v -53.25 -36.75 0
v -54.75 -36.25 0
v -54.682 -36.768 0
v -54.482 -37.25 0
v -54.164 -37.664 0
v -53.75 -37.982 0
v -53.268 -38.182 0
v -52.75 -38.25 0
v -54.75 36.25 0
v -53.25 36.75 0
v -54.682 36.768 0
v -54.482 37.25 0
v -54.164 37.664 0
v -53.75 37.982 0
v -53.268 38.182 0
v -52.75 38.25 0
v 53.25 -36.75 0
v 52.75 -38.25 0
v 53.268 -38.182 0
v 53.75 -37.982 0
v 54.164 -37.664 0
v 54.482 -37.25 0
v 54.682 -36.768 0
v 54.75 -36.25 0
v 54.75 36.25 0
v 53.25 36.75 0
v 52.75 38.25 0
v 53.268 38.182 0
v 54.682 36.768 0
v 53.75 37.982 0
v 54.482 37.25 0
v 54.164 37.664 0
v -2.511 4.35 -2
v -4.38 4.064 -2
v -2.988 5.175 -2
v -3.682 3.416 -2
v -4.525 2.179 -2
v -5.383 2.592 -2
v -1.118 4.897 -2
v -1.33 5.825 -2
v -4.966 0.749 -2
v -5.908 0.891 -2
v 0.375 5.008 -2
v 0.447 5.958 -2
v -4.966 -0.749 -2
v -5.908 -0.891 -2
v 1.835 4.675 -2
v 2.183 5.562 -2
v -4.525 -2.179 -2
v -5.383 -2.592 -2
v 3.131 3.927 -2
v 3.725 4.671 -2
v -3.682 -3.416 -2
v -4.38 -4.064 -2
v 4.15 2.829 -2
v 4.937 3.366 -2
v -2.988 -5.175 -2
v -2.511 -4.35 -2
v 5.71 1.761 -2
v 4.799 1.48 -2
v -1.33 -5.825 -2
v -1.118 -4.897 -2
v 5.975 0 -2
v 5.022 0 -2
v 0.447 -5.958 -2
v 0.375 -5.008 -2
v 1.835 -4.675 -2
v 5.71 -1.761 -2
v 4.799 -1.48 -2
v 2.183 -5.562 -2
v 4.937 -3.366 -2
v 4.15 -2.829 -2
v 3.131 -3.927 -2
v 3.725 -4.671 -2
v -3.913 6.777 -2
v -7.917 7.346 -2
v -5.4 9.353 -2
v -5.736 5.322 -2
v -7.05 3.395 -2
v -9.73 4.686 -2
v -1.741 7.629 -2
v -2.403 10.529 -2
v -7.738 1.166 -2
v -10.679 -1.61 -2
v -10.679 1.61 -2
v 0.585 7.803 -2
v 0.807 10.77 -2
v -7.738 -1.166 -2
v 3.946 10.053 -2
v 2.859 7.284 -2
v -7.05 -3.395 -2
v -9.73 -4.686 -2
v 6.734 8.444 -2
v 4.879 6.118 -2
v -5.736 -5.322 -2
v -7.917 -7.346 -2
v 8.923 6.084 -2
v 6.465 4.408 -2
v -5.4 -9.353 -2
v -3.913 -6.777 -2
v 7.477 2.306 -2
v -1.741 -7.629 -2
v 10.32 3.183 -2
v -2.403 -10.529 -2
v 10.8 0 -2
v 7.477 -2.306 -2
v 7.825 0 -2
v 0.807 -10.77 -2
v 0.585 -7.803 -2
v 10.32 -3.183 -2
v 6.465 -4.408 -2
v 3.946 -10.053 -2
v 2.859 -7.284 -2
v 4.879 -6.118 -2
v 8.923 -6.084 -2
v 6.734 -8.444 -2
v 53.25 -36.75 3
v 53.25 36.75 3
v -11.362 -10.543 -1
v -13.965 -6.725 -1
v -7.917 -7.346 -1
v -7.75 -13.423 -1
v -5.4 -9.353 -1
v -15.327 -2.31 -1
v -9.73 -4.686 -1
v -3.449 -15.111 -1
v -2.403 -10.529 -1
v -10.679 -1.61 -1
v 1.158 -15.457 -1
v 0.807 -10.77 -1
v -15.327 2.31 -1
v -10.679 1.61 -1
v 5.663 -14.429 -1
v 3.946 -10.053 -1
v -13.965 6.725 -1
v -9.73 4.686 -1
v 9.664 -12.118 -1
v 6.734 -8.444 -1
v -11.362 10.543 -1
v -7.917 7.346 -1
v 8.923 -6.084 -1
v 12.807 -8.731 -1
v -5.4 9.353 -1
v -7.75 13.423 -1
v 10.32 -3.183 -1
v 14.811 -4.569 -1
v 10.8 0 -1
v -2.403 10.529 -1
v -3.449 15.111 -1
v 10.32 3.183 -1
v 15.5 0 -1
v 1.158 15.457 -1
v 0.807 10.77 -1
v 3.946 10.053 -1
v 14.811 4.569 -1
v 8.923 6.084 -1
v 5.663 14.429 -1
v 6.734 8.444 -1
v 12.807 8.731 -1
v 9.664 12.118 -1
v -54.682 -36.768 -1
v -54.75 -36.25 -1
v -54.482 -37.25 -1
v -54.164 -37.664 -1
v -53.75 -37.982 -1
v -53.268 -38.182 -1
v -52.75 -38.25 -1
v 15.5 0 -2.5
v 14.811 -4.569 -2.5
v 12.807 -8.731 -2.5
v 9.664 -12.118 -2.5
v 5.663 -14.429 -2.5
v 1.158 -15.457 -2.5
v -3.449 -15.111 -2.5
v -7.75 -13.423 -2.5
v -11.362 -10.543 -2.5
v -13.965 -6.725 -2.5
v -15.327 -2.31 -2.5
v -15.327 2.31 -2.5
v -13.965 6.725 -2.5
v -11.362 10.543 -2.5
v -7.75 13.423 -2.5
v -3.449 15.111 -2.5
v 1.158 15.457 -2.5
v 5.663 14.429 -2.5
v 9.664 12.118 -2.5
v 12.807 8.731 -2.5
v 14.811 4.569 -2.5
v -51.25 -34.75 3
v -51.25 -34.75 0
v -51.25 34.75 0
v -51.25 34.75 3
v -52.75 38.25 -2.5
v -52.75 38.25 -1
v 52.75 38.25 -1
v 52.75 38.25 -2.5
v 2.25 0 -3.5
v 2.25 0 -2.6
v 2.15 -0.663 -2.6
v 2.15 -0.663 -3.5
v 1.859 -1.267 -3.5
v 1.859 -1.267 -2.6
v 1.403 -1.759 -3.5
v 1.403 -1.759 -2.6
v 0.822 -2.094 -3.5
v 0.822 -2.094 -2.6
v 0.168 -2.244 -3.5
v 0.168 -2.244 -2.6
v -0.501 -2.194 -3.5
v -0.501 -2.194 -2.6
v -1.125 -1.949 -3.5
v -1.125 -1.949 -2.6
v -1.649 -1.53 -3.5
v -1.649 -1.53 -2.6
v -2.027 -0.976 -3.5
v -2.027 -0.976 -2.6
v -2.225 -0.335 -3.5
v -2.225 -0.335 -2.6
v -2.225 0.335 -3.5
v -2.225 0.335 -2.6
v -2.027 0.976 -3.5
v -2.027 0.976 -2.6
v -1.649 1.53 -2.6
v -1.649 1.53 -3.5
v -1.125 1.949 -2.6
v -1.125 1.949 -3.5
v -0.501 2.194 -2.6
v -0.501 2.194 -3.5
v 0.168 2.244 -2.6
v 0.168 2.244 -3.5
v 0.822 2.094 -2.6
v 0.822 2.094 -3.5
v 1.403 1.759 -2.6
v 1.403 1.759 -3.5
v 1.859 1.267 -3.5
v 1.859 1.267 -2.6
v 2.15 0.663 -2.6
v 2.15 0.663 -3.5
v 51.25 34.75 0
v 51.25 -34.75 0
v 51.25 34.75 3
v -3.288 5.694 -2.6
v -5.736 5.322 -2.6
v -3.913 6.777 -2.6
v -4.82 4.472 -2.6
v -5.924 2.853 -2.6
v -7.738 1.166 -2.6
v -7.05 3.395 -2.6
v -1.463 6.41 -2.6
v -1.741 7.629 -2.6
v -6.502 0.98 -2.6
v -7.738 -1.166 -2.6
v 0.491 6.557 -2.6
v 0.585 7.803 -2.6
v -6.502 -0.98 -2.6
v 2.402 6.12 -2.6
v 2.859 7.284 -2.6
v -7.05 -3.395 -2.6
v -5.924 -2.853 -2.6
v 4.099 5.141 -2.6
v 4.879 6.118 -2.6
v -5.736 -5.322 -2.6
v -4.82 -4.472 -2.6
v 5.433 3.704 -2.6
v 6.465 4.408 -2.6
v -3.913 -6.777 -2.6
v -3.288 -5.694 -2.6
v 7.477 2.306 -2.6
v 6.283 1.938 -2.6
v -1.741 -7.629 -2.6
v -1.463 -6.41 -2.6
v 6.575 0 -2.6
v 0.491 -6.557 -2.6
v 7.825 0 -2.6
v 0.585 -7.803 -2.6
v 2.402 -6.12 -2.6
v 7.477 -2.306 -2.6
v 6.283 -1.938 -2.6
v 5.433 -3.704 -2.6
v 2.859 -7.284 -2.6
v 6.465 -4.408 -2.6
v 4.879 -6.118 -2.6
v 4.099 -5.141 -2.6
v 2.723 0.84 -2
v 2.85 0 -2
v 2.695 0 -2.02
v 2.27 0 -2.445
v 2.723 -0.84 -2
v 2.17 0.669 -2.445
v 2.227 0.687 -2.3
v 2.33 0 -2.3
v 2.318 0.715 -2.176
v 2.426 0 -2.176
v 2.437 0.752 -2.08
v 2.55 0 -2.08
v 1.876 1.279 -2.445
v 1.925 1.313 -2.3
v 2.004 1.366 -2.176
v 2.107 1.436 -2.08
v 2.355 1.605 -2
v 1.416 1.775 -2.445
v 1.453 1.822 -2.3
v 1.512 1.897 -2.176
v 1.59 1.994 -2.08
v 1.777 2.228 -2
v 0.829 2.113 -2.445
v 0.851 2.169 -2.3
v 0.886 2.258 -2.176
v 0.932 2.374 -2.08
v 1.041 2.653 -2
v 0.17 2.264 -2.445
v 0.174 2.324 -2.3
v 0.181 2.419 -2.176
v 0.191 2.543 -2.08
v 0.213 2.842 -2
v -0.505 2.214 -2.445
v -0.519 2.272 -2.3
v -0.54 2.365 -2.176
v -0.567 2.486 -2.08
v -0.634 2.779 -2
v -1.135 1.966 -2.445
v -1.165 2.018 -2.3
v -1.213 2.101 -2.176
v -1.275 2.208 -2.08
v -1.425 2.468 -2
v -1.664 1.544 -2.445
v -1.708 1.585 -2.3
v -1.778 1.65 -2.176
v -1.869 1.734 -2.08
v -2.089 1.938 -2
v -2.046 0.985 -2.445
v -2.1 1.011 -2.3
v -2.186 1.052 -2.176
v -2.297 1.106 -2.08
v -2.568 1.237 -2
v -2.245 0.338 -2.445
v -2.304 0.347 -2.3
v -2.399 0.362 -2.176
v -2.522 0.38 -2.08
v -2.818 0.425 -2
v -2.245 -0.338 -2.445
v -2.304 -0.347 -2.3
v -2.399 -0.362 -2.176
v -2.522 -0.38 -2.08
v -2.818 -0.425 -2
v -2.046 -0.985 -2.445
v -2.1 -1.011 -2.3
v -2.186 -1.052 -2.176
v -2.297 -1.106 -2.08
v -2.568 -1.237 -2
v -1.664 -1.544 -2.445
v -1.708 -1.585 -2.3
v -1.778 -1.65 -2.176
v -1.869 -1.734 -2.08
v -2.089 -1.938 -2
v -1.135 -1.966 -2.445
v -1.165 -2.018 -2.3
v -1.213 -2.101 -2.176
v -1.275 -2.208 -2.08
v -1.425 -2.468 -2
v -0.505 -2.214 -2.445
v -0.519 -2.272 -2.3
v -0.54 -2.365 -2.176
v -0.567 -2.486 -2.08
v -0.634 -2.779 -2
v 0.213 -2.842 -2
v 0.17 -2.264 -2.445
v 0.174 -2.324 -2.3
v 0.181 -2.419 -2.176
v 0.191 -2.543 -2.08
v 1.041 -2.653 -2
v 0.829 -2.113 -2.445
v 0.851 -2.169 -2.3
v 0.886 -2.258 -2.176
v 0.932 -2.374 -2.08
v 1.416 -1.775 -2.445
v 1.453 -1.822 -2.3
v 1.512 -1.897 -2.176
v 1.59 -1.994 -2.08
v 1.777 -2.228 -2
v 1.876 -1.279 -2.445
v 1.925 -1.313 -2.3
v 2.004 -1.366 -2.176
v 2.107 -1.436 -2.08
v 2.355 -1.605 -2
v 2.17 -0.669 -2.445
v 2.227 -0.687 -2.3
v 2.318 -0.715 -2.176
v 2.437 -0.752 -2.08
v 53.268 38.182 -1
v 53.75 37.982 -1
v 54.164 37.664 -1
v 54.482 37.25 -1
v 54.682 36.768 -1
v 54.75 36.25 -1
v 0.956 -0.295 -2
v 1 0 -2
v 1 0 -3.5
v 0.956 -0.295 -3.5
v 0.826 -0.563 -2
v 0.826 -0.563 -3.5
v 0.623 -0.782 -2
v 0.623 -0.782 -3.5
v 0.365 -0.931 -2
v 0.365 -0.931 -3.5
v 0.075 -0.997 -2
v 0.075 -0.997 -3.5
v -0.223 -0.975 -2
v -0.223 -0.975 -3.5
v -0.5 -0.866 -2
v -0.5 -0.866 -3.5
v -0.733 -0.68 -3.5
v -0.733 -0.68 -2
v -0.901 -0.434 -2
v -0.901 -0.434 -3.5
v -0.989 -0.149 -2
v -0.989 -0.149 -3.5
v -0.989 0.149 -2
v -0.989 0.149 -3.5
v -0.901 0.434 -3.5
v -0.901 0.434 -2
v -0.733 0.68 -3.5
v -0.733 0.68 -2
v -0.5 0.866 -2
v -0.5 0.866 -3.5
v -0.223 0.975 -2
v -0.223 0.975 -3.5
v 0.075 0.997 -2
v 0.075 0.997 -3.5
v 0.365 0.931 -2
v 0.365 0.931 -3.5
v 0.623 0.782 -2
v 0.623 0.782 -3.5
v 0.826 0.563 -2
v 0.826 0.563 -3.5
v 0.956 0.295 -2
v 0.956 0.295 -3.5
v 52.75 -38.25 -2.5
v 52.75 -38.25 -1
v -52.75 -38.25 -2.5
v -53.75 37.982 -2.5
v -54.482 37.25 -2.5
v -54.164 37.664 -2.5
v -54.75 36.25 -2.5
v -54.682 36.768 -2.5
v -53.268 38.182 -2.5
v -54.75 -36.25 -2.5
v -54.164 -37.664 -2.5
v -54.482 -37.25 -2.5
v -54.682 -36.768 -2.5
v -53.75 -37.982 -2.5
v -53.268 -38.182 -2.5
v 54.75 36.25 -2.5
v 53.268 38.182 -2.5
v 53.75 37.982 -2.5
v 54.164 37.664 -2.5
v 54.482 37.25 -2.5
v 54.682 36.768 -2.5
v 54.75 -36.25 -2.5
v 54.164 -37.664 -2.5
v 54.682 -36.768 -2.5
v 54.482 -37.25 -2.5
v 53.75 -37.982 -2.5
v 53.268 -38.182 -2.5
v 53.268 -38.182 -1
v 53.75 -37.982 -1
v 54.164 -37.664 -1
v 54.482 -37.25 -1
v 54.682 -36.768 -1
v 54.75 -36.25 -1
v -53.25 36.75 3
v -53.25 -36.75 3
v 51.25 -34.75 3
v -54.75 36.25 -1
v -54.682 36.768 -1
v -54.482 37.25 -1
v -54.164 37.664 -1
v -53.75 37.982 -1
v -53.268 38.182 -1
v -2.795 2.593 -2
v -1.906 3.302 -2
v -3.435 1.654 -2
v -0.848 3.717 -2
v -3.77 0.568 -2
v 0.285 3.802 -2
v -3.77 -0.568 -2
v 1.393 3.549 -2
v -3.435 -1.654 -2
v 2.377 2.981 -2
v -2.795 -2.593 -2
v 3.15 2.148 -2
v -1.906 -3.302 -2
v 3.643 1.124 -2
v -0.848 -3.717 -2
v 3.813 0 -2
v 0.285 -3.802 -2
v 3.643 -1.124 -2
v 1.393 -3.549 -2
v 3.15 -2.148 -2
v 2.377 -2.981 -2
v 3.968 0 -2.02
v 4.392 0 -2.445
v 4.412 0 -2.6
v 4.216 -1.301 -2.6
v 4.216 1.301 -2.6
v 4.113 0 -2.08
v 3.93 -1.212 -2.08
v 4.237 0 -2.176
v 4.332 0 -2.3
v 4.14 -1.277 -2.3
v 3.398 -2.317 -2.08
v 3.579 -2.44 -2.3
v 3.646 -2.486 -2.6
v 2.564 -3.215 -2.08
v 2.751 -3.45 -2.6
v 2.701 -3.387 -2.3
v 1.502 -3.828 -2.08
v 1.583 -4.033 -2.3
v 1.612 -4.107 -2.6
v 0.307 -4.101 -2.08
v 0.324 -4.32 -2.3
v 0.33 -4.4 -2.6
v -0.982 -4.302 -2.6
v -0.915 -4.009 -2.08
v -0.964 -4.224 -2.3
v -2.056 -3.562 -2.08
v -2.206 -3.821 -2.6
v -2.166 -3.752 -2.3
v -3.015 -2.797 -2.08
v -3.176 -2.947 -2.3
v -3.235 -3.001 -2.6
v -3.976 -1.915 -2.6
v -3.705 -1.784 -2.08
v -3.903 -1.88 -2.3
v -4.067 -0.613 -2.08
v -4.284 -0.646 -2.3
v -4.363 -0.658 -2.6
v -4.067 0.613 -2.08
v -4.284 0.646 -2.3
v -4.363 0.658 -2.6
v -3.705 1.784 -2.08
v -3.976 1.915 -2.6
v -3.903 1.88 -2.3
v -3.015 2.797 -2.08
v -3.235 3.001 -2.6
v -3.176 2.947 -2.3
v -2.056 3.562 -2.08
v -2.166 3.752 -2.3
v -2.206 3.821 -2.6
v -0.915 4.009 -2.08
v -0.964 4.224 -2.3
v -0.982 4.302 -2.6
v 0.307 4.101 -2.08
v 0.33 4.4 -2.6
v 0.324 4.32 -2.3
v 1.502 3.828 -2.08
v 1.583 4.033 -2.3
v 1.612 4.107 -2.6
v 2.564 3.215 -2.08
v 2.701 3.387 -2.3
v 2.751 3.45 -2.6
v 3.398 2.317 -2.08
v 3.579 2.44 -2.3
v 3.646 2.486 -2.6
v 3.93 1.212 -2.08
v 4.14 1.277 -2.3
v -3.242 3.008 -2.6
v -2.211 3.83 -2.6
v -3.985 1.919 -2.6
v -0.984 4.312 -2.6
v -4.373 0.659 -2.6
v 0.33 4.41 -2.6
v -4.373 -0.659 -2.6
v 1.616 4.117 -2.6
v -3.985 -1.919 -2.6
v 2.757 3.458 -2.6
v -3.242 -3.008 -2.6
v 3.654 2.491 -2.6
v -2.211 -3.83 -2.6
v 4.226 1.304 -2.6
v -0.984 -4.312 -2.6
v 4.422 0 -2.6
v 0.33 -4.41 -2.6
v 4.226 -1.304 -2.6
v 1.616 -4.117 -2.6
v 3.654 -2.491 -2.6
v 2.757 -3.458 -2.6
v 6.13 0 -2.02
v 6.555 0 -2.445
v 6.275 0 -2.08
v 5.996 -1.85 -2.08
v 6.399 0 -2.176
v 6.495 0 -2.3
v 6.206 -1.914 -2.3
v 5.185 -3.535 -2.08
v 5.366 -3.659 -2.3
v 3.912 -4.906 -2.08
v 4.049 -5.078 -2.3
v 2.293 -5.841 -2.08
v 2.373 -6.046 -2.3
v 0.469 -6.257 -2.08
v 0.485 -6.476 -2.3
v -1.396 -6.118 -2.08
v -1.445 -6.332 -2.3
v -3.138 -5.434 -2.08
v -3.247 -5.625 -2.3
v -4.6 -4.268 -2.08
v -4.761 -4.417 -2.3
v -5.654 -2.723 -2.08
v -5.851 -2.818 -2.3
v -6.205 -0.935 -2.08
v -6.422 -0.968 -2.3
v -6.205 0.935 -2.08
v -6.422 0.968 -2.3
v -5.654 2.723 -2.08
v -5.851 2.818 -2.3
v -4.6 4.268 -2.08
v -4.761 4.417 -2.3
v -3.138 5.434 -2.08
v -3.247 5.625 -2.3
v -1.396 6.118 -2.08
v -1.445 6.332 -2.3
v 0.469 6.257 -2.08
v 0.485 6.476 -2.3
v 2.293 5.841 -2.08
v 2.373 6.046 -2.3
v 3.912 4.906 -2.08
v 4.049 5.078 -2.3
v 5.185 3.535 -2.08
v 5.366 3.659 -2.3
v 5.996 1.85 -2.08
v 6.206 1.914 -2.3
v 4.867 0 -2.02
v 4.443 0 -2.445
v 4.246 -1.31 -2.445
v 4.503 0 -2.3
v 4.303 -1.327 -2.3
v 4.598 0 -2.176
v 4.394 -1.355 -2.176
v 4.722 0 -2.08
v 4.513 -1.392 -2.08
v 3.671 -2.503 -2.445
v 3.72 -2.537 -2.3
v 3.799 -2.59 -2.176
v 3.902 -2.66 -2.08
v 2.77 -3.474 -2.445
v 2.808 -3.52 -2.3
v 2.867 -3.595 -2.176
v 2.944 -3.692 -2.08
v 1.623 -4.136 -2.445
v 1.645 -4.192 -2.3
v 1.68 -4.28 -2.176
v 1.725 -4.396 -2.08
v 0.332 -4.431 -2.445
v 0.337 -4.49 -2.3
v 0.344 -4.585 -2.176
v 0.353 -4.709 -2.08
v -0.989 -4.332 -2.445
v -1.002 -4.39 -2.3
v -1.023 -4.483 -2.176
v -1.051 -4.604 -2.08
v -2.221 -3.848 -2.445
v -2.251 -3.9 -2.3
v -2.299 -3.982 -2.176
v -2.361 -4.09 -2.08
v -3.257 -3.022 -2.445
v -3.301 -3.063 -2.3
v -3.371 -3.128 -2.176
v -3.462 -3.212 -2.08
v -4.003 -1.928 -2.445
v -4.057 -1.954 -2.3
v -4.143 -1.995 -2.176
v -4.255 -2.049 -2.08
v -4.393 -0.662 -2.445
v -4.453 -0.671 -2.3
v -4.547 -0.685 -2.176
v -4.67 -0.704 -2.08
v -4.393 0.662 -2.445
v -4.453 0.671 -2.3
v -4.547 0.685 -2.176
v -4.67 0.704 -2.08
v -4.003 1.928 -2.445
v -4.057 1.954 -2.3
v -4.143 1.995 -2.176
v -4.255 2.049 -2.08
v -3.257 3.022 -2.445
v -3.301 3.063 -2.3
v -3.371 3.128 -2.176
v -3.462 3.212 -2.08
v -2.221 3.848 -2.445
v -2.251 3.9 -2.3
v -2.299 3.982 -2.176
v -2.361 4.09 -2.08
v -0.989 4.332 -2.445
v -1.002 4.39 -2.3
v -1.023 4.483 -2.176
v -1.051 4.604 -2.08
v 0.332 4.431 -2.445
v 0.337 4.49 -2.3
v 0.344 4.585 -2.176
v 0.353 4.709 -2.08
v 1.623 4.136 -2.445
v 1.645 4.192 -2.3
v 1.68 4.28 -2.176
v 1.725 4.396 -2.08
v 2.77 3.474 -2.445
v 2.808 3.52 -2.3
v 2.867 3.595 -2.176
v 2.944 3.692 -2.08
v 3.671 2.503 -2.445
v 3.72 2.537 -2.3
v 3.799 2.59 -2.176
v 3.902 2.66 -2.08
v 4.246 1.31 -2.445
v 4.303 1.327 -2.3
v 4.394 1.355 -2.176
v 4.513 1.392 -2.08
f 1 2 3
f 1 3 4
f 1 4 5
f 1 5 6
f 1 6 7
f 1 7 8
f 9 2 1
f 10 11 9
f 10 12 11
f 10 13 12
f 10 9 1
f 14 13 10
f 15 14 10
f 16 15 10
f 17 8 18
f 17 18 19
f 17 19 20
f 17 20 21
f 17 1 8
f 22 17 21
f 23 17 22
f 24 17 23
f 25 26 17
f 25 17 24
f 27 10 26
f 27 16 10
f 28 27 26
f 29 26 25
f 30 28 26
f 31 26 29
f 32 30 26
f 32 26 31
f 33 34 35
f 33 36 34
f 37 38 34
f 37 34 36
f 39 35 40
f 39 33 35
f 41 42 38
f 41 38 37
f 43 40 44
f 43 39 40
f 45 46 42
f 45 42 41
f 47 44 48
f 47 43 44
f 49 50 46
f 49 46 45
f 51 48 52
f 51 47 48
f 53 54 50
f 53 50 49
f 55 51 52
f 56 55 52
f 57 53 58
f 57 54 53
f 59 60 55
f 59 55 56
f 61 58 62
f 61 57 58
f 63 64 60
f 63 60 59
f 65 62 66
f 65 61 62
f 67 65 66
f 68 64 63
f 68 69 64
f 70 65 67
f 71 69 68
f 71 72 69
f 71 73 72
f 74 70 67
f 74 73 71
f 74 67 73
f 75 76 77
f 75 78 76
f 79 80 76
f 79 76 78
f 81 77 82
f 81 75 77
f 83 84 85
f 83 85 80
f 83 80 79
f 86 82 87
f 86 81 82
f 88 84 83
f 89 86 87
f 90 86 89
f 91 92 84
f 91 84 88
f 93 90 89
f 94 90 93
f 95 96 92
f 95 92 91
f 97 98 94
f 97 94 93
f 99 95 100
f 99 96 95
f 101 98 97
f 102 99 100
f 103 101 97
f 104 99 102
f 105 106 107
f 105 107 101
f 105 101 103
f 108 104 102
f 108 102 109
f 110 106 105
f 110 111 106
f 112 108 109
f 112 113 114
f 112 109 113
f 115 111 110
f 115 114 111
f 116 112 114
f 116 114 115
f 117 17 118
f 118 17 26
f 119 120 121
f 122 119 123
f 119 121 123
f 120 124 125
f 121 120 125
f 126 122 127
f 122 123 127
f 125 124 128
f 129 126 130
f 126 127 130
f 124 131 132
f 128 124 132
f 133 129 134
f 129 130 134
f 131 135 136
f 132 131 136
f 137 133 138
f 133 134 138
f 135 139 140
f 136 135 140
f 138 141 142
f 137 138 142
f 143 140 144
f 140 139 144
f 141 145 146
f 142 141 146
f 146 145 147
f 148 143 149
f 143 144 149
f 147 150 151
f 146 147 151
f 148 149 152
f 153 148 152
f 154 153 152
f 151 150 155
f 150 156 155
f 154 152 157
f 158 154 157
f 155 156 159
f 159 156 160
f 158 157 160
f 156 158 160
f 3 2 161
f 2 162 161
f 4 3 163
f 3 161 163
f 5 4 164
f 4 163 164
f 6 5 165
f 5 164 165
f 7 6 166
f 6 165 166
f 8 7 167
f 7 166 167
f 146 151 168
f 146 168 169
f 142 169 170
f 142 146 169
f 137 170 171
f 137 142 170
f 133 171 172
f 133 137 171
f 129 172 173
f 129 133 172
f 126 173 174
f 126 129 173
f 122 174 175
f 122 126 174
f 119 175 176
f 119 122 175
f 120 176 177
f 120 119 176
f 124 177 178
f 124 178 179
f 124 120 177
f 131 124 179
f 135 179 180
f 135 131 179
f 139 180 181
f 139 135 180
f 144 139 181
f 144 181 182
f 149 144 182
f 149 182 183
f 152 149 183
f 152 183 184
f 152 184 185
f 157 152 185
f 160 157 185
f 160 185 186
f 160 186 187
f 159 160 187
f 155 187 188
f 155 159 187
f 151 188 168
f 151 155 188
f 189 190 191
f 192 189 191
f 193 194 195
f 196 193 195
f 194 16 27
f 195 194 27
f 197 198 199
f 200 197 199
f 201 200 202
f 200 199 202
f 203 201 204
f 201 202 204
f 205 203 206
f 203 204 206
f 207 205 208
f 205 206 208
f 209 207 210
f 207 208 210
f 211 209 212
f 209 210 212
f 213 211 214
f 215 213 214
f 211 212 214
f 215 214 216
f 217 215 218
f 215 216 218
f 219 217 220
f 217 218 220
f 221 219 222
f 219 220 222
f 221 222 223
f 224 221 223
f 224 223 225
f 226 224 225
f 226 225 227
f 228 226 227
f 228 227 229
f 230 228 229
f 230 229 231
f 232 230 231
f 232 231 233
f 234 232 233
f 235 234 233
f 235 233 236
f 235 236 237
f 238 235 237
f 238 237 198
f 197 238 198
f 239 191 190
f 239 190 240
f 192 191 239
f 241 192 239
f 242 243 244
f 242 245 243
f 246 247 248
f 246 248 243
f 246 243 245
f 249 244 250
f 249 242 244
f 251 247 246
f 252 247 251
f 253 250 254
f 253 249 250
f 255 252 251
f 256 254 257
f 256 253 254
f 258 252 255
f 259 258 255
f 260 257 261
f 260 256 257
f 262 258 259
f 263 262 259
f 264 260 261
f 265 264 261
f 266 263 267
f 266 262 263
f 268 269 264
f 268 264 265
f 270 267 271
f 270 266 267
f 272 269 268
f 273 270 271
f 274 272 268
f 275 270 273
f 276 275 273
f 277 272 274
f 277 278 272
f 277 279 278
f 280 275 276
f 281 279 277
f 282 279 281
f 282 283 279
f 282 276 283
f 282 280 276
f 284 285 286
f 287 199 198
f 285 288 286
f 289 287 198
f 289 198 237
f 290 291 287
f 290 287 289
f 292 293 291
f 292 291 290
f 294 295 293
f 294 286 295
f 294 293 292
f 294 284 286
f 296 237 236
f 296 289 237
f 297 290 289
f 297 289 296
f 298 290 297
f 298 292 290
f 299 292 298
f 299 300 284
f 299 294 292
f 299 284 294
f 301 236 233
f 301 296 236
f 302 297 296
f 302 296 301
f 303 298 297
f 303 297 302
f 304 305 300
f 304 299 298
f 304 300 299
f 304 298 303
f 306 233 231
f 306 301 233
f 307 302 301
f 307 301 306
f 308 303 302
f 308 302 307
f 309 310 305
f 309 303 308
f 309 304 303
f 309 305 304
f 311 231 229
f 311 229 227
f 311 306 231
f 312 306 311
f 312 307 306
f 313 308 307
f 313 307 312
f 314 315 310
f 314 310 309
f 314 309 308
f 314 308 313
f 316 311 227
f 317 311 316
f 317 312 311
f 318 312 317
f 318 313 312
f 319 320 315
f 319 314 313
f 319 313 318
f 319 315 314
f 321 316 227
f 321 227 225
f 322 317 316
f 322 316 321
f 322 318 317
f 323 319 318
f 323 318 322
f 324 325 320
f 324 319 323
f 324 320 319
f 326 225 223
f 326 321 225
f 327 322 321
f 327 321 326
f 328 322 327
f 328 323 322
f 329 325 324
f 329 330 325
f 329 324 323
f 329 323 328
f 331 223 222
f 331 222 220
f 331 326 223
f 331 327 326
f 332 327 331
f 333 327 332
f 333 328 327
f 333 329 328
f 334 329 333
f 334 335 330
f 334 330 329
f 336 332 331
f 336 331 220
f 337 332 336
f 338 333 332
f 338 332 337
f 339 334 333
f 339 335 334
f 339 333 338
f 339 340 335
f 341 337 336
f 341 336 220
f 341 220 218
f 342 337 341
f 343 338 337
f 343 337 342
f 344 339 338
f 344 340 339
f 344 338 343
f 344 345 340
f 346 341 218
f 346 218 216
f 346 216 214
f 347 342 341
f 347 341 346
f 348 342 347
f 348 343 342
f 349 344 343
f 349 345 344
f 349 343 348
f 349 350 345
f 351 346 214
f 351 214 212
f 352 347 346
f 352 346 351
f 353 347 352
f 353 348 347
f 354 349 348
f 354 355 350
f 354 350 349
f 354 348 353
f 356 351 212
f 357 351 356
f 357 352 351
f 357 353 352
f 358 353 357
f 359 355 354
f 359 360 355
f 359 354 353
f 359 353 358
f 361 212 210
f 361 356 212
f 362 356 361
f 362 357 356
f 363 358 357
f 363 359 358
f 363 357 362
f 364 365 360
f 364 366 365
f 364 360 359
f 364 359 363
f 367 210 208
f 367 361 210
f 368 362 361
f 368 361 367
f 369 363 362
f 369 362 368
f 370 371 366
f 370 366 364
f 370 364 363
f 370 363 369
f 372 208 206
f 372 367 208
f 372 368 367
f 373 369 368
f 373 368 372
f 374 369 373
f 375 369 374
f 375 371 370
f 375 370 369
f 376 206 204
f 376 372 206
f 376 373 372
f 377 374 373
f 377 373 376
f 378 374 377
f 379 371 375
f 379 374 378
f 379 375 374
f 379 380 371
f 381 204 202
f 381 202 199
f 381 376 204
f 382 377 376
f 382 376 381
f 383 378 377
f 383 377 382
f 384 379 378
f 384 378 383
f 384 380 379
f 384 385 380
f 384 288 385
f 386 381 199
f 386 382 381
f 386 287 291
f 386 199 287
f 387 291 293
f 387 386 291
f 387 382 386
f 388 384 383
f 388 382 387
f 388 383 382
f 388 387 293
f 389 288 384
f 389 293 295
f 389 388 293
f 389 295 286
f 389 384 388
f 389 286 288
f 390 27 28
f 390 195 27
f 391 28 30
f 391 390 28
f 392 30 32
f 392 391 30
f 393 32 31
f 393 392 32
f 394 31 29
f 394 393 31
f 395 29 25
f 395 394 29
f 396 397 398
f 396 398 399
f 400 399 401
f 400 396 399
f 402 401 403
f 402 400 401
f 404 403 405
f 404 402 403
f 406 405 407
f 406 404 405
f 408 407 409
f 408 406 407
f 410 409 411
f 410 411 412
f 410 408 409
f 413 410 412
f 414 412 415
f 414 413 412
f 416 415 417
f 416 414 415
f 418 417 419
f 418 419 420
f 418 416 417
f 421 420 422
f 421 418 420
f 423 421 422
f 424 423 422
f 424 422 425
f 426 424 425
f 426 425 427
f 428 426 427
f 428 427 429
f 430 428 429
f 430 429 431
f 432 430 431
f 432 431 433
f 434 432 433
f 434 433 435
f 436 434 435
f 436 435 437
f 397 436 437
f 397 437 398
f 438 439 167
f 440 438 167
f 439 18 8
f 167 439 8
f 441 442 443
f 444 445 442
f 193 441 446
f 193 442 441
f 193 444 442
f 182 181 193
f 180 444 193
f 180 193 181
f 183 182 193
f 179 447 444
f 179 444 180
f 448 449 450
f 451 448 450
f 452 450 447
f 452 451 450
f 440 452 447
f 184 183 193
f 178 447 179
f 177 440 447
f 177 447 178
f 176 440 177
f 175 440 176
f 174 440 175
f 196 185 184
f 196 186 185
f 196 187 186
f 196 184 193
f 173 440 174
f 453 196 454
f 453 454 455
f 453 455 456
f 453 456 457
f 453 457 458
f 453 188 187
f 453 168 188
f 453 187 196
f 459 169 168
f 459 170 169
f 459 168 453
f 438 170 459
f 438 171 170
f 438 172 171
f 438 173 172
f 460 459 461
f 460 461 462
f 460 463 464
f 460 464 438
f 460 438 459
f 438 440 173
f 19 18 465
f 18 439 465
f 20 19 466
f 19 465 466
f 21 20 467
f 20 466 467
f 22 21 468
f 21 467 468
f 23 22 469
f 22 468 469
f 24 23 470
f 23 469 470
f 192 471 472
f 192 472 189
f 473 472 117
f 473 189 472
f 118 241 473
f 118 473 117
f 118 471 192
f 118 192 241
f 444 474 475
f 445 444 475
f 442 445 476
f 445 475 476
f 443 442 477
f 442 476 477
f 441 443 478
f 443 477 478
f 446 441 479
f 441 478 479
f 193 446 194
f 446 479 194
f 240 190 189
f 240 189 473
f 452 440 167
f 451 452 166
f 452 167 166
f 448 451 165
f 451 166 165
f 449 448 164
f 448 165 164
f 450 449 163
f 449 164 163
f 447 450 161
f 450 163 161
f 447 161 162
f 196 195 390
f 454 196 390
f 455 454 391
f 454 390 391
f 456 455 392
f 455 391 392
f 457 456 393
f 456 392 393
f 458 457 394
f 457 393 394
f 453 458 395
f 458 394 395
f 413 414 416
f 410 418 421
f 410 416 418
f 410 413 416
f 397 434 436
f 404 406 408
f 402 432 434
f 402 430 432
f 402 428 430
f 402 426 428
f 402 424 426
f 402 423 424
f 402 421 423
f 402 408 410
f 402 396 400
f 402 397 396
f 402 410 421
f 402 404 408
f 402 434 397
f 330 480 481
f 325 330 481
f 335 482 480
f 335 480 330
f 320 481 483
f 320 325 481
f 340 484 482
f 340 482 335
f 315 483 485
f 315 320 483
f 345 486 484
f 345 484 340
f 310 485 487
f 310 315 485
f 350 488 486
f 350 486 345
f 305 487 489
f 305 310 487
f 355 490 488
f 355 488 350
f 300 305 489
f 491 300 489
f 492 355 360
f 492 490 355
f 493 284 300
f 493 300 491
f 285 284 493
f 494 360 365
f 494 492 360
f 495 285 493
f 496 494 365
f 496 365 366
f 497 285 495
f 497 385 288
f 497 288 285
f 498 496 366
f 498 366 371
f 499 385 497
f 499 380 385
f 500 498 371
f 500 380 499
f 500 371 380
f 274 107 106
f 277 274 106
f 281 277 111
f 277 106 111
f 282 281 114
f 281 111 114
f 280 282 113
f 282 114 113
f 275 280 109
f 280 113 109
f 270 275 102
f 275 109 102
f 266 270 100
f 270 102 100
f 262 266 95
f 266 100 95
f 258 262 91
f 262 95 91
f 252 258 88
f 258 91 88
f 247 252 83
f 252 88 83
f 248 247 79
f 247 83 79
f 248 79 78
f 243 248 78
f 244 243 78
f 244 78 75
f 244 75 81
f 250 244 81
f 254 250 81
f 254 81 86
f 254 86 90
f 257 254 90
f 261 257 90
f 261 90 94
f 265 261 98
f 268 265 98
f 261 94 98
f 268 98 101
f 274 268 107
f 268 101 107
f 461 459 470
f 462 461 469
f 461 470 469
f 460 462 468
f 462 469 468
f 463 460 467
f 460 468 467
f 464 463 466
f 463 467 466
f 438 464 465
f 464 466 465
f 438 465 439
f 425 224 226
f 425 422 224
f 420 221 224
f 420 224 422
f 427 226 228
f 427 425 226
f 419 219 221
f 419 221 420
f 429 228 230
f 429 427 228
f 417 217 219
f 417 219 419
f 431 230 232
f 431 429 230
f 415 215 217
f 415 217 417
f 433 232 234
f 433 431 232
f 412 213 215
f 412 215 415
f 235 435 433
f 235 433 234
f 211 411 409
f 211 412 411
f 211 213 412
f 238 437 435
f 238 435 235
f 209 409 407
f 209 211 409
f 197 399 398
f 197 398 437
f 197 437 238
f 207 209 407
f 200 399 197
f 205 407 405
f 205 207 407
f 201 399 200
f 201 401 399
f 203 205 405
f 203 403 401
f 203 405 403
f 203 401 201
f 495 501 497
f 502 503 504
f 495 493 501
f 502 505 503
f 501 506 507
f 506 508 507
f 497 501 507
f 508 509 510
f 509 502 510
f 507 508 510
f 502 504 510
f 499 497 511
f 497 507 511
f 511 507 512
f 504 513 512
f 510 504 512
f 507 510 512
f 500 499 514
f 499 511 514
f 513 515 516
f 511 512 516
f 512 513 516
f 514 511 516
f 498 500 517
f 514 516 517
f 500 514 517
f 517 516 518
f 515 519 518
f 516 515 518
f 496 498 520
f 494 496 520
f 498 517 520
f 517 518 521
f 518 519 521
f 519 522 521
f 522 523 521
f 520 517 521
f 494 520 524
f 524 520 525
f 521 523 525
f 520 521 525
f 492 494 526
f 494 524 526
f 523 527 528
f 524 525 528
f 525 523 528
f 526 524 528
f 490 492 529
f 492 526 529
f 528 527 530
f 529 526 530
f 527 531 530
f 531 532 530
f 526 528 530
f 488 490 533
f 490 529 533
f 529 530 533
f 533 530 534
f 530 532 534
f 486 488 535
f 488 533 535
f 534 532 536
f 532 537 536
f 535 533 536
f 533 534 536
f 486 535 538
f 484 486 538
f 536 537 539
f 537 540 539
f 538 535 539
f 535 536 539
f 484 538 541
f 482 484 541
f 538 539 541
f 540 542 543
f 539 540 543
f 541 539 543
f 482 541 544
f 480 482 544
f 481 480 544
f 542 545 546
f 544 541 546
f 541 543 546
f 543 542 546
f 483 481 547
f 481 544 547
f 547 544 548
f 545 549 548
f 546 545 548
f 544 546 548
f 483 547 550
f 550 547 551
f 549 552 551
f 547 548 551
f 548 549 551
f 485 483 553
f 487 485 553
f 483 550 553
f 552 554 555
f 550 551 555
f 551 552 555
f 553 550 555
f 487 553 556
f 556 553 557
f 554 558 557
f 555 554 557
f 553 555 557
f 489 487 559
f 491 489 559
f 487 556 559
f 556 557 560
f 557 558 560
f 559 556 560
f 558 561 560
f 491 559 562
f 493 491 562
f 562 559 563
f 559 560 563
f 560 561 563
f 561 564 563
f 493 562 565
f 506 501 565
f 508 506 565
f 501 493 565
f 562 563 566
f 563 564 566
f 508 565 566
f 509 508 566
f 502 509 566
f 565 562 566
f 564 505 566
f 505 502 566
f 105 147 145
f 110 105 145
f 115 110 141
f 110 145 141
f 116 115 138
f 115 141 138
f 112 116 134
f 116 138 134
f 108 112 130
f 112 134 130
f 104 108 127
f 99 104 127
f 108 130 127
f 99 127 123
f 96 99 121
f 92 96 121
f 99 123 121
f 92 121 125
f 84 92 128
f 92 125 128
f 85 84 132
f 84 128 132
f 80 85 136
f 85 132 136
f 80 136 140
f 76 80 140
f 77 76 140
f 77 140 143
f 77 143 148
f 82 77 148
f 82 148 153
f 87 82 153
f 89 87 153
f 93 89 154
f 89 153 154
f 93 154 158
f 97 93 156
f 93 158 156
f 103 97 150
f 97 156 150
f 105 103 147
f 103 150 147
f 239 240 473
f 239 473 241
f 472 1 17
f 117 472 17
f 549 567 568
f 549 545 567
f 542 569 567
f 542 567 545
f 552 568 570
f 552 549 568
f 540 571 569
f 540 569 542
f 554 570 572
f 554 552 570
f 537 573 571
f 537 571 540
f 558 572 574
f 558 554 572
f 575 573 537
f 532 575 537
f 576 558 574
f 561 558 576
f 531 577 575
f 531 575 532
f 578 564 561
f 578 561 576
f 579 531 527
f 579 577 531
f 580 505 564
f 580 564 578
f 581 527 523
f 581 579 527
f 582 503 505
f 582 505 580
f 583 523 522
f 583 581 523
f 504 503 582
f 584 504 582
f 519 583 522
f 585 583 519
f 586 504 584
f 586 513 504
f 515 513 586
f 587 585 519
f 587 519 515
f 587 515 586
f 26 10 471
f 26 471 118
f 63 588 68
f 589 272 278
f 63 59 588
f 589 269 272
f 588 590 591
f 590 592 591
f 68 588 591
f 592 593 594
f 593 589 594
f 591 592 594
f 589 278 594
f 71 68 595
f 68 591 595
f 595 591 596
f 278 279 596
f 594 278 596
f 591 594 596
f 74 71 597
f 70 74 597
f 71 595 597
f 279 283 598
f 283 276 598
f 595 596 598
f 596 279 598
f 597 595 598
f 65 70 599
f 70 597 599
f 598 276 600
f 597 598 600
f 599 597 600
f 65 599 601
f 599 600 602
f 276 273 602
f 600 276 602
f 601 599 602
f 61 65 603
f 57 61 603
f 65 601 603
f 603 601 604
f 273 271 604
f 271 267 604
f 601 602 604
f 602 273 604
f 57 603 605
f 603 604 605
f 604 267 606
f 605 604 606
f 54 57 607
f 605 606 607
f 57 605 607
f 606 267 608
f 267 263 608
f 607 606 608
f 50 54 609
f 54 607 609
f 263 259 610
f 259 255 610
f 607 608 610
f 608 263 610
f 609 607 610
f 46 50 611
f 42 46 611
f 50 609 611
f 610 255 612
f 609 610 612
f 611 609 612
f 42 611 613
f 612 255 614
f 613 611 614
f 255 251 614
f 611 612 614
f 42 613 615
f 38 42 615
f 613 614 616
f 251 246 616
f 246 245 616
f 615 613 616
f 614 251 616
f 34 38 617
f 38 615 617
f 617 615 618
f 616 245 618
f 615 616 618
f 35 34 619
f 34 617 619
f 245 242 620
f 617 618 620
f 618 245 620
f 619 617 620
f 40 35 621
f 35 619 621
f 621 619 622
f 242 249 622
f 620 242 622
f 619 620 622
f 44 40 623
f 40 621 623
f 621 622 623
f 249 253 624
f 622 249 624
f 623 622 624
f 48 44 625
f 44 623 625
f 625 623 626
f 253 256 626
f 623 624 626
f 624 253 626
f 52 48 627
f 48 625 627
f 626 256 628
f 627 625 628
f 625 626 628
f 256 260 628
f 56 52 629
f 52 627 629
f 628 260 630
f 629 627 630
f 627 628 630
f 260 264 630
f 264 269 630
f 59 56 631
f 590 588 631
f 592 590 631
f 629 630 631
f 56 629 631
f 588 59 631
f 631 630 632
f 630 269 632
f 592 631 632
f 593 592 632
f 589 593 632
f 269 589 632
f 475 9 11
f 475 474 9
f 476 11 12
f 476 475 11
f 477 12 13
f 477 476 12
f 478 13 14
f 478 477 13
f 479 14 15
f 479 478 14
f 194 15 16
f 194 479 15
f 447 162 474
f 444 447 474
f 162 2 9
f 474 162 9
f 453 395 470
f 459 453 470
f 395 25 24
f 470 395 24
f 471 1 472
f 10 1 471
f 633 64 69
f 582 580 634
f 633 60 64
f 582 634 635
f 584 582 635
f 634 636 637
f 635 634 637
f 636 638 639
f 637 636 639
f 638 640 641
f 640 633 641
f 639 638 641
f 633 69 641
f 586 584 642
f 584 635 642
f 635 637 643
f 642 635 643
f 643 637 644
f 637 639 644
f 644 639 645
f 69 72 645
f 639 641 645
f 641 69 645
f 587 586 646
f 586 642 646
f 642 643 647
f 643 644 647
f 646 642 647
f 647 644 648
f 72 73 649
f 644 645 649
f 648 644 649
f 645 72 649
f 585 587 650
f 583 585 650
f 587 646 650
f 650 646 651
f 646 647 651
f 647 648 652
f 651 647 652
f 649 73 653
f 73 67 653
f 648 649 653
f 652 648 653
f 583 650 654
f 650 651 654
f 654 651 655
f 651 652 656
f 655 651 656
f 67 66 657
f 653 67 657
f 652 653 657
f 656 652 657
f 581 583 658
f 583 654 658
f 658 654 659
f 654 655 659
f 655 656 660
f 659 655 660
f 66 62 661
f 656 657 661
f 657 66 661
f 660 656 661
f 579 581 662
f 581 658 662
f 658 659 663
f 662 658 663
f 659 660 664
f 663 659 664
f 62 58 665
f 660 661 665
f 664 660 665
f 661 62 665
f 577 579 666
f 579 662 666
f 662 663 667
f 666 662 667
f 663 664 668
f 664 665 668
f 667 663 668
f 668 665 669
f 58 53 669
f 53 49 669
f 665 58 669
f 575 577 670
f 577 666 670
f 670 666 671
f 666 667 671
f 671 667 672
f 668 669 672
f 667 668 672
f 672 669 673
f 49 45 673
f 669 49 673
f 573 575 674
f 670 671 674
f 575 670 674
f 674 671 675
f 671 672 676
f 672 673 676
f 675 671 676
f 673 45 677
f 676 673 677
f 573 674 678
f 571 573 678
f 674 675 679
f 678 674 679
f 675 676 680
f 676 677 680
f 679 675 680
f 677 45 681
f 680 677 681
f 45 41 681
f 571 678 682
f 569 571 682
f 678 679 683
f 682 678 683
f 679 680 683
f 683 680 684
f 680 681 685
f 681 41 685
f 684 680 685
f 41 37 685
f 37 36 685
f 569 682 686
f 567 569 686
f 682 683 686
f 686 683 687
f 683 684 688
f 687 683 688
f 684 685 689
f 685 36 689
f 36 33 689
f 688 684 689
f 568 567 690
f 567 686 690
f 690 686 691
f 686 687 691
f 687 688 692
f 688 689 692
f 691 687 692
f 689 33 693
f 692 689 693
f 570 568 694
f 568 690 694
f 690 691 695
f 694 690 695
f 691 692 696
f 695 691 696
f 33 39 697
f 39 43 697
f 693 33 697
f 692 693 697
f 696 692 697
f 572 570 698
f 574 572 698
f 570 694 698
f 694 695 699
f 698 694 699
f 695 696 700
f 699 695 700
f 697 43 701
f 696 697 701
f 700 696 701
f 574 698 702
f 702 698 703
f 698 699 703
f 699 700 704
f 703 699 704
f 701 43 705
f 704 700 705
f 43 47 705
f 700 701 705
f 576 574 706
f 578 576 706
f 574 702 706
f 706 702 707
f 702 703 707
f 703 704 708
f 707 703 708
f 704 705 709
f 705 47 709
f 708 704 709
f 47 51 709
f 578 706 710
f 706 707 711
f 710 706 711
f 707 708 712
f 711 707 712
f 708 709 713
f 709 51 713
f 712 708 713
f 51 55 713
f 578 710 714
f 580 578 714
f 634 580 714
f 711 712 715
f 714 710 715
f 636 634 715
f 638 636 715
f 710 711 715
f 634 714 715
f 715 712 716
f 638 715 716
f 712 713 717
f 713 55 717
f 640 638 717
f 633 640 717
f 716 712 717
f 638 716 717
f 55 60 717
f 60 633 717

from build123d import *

# Parameters (mm, degrees)
F2_W      = 109.5
F2_H      = 76.5
F3_DEPTH  = 1
F1_W      = 106.5
F1_H      = 73.5
F4_DEPTH  = 3
F0_W      = 102.5
F0_H      = 69.5
F5_DEPTH  = 3
F6_R      = 10.8
F7_DEPTH  = 1
F8_R      = 2.25
F8_R_2    = 1
F9_DEPTH  = 2.5
F10_R     = 7.825
F10_R_2   = 6.575
F11_DEPTH = 0.6
F12_R     = 4.4225
F12_R_2   = 4.4125
F13_DEPTH = 0.6
F14_R     = 0.59999
F15_R     = 2
F16_R     = 15.5
F17_DEPTH = 1.5


# Not quite as in the source:
# - a fillet or chamfer is up to 0.001 mm smaller than in the source, because OpenCascade refuses the exact size


with BuildPart() as f3:
    # F2 (on Top) → F3 (new body)
    with BuildSketch(Plane.XY):
        Rectangle(F2_W, F2_H)
    extrude(amount=-F3_DEPTH)

    # F1 (on Top) → F4 (join)
    with BuildSketch(Plane.XY):
        Rectangle(F1_W, F1_H)
    extrude(amount=F4_DEPTH)

    # F0 (on Top) → F5 (cut, through all)
    with BuildSketch(Plane.XY):
        Rectangle(F0_W, F0_H)
    extrude(amount=F5_DEPTH, mode=Mode.SUBTRACT)

    # F6 (on face) → F7 (join)
    with BuildSketch(Plane(origin=(0, 0, -1), x_dir=(1, 0, 0), z_dir=(0, 0, -1))):
        Circle(F6_R)
    extrude(amount=F7_DEPTH)

    # F8 (on face) → F9 (join)
    with BuildSketch(Plane(origin=(0, 0, -1), x_dir=(1, 0, 0), z_dir=(0, 0, -1))):
        Circle(F8_R)
        Circle(F8_R_2, mode=Mode.SUBTRACT)
    extrude(amount=F9_DEPTH)

    # F10 (on face) → F11 (join)
    with BuildSketch(Plane(origin=(0, 0, -2), x_dir=(1, 0, 0), z_dir=(0, 0, -1))):
        Circle(F10_R)
        Circle(F10_R_2, mode=Mode.SUBTRACT)
    extrude(amount=F11_DEPTH)

    # F12 (on face) → F13 (join)
    with BuildSketch(Plane(origin=(0, 0, -2), x_dir=(1, 0, 0), z_dir=(0, 0, -1))):
        Circle(F12_R)
        Circle(F12_R_2, mode=Mode.SUBTRACT)
    extrude(amount=F13_DEPTH)

    # F14 (radius 0.6 in the source; OpenCascade refuses exactly that, so slightly less here)
    f14_edges = [f3.edges().sort_by_distance(p)[0] for p in [
        (-4.4225, 0, -2),
        (-6.575, 0, -2),
        (-2.25, 0, -2),
        (-4.4125, 0, -2),
    ]]
    fillet(f14_edges, radius=F14_R)

    # F15
    f15_edges = [f3.edges().sort_by_distance(p)[0] for p in [
        (-54.75, -38.25, -0.5),
        (54.75, -38.25, -0.5),
        (54.75, 38.25, -0.5),
        (-54.75, 38.25, -0.5),
    ]]
    fillet(f15_edges, radius=F15_R)

    # F16 (on face) → F17 (join)
    with BuildSketch(Plane(origin=(0, 0, -1), x_dir=(1, 0, 0), z_dir=(0, 0, -1))):
        with BuildLine():
            ThreePointArc((-52.75, 38.25), (-54.1642135624, 37.6642135624), (-54.75, 36.25))
            Line((-54.75, 36.25), (-54.75, -36.25))
            ThreePointArc((-54.75, -36.25), (-54.1642135624, -37.6642135624), (-52.75, -38.25))
            Line((-52.75, -38.25), (52.75, -38.25))
            ThreePointArc((52.75, -38.25), (54.1642135624, -37.6642135624), (54.75, -36.25))
            Line((54.75, -36.25), (54.75, 36.25))
            ThreePointArc((54.75, 36.25), (54.1642135624, 37.6642135624), (52.75, 38.25))
            Line((52.75, 38.25), (-52.75, 38.25))
        make_face()
        Circle(F16_R, mode=Mode.SUBTRACT)
    extrude(amount=F17_DEPTH)


solid = f3.part
